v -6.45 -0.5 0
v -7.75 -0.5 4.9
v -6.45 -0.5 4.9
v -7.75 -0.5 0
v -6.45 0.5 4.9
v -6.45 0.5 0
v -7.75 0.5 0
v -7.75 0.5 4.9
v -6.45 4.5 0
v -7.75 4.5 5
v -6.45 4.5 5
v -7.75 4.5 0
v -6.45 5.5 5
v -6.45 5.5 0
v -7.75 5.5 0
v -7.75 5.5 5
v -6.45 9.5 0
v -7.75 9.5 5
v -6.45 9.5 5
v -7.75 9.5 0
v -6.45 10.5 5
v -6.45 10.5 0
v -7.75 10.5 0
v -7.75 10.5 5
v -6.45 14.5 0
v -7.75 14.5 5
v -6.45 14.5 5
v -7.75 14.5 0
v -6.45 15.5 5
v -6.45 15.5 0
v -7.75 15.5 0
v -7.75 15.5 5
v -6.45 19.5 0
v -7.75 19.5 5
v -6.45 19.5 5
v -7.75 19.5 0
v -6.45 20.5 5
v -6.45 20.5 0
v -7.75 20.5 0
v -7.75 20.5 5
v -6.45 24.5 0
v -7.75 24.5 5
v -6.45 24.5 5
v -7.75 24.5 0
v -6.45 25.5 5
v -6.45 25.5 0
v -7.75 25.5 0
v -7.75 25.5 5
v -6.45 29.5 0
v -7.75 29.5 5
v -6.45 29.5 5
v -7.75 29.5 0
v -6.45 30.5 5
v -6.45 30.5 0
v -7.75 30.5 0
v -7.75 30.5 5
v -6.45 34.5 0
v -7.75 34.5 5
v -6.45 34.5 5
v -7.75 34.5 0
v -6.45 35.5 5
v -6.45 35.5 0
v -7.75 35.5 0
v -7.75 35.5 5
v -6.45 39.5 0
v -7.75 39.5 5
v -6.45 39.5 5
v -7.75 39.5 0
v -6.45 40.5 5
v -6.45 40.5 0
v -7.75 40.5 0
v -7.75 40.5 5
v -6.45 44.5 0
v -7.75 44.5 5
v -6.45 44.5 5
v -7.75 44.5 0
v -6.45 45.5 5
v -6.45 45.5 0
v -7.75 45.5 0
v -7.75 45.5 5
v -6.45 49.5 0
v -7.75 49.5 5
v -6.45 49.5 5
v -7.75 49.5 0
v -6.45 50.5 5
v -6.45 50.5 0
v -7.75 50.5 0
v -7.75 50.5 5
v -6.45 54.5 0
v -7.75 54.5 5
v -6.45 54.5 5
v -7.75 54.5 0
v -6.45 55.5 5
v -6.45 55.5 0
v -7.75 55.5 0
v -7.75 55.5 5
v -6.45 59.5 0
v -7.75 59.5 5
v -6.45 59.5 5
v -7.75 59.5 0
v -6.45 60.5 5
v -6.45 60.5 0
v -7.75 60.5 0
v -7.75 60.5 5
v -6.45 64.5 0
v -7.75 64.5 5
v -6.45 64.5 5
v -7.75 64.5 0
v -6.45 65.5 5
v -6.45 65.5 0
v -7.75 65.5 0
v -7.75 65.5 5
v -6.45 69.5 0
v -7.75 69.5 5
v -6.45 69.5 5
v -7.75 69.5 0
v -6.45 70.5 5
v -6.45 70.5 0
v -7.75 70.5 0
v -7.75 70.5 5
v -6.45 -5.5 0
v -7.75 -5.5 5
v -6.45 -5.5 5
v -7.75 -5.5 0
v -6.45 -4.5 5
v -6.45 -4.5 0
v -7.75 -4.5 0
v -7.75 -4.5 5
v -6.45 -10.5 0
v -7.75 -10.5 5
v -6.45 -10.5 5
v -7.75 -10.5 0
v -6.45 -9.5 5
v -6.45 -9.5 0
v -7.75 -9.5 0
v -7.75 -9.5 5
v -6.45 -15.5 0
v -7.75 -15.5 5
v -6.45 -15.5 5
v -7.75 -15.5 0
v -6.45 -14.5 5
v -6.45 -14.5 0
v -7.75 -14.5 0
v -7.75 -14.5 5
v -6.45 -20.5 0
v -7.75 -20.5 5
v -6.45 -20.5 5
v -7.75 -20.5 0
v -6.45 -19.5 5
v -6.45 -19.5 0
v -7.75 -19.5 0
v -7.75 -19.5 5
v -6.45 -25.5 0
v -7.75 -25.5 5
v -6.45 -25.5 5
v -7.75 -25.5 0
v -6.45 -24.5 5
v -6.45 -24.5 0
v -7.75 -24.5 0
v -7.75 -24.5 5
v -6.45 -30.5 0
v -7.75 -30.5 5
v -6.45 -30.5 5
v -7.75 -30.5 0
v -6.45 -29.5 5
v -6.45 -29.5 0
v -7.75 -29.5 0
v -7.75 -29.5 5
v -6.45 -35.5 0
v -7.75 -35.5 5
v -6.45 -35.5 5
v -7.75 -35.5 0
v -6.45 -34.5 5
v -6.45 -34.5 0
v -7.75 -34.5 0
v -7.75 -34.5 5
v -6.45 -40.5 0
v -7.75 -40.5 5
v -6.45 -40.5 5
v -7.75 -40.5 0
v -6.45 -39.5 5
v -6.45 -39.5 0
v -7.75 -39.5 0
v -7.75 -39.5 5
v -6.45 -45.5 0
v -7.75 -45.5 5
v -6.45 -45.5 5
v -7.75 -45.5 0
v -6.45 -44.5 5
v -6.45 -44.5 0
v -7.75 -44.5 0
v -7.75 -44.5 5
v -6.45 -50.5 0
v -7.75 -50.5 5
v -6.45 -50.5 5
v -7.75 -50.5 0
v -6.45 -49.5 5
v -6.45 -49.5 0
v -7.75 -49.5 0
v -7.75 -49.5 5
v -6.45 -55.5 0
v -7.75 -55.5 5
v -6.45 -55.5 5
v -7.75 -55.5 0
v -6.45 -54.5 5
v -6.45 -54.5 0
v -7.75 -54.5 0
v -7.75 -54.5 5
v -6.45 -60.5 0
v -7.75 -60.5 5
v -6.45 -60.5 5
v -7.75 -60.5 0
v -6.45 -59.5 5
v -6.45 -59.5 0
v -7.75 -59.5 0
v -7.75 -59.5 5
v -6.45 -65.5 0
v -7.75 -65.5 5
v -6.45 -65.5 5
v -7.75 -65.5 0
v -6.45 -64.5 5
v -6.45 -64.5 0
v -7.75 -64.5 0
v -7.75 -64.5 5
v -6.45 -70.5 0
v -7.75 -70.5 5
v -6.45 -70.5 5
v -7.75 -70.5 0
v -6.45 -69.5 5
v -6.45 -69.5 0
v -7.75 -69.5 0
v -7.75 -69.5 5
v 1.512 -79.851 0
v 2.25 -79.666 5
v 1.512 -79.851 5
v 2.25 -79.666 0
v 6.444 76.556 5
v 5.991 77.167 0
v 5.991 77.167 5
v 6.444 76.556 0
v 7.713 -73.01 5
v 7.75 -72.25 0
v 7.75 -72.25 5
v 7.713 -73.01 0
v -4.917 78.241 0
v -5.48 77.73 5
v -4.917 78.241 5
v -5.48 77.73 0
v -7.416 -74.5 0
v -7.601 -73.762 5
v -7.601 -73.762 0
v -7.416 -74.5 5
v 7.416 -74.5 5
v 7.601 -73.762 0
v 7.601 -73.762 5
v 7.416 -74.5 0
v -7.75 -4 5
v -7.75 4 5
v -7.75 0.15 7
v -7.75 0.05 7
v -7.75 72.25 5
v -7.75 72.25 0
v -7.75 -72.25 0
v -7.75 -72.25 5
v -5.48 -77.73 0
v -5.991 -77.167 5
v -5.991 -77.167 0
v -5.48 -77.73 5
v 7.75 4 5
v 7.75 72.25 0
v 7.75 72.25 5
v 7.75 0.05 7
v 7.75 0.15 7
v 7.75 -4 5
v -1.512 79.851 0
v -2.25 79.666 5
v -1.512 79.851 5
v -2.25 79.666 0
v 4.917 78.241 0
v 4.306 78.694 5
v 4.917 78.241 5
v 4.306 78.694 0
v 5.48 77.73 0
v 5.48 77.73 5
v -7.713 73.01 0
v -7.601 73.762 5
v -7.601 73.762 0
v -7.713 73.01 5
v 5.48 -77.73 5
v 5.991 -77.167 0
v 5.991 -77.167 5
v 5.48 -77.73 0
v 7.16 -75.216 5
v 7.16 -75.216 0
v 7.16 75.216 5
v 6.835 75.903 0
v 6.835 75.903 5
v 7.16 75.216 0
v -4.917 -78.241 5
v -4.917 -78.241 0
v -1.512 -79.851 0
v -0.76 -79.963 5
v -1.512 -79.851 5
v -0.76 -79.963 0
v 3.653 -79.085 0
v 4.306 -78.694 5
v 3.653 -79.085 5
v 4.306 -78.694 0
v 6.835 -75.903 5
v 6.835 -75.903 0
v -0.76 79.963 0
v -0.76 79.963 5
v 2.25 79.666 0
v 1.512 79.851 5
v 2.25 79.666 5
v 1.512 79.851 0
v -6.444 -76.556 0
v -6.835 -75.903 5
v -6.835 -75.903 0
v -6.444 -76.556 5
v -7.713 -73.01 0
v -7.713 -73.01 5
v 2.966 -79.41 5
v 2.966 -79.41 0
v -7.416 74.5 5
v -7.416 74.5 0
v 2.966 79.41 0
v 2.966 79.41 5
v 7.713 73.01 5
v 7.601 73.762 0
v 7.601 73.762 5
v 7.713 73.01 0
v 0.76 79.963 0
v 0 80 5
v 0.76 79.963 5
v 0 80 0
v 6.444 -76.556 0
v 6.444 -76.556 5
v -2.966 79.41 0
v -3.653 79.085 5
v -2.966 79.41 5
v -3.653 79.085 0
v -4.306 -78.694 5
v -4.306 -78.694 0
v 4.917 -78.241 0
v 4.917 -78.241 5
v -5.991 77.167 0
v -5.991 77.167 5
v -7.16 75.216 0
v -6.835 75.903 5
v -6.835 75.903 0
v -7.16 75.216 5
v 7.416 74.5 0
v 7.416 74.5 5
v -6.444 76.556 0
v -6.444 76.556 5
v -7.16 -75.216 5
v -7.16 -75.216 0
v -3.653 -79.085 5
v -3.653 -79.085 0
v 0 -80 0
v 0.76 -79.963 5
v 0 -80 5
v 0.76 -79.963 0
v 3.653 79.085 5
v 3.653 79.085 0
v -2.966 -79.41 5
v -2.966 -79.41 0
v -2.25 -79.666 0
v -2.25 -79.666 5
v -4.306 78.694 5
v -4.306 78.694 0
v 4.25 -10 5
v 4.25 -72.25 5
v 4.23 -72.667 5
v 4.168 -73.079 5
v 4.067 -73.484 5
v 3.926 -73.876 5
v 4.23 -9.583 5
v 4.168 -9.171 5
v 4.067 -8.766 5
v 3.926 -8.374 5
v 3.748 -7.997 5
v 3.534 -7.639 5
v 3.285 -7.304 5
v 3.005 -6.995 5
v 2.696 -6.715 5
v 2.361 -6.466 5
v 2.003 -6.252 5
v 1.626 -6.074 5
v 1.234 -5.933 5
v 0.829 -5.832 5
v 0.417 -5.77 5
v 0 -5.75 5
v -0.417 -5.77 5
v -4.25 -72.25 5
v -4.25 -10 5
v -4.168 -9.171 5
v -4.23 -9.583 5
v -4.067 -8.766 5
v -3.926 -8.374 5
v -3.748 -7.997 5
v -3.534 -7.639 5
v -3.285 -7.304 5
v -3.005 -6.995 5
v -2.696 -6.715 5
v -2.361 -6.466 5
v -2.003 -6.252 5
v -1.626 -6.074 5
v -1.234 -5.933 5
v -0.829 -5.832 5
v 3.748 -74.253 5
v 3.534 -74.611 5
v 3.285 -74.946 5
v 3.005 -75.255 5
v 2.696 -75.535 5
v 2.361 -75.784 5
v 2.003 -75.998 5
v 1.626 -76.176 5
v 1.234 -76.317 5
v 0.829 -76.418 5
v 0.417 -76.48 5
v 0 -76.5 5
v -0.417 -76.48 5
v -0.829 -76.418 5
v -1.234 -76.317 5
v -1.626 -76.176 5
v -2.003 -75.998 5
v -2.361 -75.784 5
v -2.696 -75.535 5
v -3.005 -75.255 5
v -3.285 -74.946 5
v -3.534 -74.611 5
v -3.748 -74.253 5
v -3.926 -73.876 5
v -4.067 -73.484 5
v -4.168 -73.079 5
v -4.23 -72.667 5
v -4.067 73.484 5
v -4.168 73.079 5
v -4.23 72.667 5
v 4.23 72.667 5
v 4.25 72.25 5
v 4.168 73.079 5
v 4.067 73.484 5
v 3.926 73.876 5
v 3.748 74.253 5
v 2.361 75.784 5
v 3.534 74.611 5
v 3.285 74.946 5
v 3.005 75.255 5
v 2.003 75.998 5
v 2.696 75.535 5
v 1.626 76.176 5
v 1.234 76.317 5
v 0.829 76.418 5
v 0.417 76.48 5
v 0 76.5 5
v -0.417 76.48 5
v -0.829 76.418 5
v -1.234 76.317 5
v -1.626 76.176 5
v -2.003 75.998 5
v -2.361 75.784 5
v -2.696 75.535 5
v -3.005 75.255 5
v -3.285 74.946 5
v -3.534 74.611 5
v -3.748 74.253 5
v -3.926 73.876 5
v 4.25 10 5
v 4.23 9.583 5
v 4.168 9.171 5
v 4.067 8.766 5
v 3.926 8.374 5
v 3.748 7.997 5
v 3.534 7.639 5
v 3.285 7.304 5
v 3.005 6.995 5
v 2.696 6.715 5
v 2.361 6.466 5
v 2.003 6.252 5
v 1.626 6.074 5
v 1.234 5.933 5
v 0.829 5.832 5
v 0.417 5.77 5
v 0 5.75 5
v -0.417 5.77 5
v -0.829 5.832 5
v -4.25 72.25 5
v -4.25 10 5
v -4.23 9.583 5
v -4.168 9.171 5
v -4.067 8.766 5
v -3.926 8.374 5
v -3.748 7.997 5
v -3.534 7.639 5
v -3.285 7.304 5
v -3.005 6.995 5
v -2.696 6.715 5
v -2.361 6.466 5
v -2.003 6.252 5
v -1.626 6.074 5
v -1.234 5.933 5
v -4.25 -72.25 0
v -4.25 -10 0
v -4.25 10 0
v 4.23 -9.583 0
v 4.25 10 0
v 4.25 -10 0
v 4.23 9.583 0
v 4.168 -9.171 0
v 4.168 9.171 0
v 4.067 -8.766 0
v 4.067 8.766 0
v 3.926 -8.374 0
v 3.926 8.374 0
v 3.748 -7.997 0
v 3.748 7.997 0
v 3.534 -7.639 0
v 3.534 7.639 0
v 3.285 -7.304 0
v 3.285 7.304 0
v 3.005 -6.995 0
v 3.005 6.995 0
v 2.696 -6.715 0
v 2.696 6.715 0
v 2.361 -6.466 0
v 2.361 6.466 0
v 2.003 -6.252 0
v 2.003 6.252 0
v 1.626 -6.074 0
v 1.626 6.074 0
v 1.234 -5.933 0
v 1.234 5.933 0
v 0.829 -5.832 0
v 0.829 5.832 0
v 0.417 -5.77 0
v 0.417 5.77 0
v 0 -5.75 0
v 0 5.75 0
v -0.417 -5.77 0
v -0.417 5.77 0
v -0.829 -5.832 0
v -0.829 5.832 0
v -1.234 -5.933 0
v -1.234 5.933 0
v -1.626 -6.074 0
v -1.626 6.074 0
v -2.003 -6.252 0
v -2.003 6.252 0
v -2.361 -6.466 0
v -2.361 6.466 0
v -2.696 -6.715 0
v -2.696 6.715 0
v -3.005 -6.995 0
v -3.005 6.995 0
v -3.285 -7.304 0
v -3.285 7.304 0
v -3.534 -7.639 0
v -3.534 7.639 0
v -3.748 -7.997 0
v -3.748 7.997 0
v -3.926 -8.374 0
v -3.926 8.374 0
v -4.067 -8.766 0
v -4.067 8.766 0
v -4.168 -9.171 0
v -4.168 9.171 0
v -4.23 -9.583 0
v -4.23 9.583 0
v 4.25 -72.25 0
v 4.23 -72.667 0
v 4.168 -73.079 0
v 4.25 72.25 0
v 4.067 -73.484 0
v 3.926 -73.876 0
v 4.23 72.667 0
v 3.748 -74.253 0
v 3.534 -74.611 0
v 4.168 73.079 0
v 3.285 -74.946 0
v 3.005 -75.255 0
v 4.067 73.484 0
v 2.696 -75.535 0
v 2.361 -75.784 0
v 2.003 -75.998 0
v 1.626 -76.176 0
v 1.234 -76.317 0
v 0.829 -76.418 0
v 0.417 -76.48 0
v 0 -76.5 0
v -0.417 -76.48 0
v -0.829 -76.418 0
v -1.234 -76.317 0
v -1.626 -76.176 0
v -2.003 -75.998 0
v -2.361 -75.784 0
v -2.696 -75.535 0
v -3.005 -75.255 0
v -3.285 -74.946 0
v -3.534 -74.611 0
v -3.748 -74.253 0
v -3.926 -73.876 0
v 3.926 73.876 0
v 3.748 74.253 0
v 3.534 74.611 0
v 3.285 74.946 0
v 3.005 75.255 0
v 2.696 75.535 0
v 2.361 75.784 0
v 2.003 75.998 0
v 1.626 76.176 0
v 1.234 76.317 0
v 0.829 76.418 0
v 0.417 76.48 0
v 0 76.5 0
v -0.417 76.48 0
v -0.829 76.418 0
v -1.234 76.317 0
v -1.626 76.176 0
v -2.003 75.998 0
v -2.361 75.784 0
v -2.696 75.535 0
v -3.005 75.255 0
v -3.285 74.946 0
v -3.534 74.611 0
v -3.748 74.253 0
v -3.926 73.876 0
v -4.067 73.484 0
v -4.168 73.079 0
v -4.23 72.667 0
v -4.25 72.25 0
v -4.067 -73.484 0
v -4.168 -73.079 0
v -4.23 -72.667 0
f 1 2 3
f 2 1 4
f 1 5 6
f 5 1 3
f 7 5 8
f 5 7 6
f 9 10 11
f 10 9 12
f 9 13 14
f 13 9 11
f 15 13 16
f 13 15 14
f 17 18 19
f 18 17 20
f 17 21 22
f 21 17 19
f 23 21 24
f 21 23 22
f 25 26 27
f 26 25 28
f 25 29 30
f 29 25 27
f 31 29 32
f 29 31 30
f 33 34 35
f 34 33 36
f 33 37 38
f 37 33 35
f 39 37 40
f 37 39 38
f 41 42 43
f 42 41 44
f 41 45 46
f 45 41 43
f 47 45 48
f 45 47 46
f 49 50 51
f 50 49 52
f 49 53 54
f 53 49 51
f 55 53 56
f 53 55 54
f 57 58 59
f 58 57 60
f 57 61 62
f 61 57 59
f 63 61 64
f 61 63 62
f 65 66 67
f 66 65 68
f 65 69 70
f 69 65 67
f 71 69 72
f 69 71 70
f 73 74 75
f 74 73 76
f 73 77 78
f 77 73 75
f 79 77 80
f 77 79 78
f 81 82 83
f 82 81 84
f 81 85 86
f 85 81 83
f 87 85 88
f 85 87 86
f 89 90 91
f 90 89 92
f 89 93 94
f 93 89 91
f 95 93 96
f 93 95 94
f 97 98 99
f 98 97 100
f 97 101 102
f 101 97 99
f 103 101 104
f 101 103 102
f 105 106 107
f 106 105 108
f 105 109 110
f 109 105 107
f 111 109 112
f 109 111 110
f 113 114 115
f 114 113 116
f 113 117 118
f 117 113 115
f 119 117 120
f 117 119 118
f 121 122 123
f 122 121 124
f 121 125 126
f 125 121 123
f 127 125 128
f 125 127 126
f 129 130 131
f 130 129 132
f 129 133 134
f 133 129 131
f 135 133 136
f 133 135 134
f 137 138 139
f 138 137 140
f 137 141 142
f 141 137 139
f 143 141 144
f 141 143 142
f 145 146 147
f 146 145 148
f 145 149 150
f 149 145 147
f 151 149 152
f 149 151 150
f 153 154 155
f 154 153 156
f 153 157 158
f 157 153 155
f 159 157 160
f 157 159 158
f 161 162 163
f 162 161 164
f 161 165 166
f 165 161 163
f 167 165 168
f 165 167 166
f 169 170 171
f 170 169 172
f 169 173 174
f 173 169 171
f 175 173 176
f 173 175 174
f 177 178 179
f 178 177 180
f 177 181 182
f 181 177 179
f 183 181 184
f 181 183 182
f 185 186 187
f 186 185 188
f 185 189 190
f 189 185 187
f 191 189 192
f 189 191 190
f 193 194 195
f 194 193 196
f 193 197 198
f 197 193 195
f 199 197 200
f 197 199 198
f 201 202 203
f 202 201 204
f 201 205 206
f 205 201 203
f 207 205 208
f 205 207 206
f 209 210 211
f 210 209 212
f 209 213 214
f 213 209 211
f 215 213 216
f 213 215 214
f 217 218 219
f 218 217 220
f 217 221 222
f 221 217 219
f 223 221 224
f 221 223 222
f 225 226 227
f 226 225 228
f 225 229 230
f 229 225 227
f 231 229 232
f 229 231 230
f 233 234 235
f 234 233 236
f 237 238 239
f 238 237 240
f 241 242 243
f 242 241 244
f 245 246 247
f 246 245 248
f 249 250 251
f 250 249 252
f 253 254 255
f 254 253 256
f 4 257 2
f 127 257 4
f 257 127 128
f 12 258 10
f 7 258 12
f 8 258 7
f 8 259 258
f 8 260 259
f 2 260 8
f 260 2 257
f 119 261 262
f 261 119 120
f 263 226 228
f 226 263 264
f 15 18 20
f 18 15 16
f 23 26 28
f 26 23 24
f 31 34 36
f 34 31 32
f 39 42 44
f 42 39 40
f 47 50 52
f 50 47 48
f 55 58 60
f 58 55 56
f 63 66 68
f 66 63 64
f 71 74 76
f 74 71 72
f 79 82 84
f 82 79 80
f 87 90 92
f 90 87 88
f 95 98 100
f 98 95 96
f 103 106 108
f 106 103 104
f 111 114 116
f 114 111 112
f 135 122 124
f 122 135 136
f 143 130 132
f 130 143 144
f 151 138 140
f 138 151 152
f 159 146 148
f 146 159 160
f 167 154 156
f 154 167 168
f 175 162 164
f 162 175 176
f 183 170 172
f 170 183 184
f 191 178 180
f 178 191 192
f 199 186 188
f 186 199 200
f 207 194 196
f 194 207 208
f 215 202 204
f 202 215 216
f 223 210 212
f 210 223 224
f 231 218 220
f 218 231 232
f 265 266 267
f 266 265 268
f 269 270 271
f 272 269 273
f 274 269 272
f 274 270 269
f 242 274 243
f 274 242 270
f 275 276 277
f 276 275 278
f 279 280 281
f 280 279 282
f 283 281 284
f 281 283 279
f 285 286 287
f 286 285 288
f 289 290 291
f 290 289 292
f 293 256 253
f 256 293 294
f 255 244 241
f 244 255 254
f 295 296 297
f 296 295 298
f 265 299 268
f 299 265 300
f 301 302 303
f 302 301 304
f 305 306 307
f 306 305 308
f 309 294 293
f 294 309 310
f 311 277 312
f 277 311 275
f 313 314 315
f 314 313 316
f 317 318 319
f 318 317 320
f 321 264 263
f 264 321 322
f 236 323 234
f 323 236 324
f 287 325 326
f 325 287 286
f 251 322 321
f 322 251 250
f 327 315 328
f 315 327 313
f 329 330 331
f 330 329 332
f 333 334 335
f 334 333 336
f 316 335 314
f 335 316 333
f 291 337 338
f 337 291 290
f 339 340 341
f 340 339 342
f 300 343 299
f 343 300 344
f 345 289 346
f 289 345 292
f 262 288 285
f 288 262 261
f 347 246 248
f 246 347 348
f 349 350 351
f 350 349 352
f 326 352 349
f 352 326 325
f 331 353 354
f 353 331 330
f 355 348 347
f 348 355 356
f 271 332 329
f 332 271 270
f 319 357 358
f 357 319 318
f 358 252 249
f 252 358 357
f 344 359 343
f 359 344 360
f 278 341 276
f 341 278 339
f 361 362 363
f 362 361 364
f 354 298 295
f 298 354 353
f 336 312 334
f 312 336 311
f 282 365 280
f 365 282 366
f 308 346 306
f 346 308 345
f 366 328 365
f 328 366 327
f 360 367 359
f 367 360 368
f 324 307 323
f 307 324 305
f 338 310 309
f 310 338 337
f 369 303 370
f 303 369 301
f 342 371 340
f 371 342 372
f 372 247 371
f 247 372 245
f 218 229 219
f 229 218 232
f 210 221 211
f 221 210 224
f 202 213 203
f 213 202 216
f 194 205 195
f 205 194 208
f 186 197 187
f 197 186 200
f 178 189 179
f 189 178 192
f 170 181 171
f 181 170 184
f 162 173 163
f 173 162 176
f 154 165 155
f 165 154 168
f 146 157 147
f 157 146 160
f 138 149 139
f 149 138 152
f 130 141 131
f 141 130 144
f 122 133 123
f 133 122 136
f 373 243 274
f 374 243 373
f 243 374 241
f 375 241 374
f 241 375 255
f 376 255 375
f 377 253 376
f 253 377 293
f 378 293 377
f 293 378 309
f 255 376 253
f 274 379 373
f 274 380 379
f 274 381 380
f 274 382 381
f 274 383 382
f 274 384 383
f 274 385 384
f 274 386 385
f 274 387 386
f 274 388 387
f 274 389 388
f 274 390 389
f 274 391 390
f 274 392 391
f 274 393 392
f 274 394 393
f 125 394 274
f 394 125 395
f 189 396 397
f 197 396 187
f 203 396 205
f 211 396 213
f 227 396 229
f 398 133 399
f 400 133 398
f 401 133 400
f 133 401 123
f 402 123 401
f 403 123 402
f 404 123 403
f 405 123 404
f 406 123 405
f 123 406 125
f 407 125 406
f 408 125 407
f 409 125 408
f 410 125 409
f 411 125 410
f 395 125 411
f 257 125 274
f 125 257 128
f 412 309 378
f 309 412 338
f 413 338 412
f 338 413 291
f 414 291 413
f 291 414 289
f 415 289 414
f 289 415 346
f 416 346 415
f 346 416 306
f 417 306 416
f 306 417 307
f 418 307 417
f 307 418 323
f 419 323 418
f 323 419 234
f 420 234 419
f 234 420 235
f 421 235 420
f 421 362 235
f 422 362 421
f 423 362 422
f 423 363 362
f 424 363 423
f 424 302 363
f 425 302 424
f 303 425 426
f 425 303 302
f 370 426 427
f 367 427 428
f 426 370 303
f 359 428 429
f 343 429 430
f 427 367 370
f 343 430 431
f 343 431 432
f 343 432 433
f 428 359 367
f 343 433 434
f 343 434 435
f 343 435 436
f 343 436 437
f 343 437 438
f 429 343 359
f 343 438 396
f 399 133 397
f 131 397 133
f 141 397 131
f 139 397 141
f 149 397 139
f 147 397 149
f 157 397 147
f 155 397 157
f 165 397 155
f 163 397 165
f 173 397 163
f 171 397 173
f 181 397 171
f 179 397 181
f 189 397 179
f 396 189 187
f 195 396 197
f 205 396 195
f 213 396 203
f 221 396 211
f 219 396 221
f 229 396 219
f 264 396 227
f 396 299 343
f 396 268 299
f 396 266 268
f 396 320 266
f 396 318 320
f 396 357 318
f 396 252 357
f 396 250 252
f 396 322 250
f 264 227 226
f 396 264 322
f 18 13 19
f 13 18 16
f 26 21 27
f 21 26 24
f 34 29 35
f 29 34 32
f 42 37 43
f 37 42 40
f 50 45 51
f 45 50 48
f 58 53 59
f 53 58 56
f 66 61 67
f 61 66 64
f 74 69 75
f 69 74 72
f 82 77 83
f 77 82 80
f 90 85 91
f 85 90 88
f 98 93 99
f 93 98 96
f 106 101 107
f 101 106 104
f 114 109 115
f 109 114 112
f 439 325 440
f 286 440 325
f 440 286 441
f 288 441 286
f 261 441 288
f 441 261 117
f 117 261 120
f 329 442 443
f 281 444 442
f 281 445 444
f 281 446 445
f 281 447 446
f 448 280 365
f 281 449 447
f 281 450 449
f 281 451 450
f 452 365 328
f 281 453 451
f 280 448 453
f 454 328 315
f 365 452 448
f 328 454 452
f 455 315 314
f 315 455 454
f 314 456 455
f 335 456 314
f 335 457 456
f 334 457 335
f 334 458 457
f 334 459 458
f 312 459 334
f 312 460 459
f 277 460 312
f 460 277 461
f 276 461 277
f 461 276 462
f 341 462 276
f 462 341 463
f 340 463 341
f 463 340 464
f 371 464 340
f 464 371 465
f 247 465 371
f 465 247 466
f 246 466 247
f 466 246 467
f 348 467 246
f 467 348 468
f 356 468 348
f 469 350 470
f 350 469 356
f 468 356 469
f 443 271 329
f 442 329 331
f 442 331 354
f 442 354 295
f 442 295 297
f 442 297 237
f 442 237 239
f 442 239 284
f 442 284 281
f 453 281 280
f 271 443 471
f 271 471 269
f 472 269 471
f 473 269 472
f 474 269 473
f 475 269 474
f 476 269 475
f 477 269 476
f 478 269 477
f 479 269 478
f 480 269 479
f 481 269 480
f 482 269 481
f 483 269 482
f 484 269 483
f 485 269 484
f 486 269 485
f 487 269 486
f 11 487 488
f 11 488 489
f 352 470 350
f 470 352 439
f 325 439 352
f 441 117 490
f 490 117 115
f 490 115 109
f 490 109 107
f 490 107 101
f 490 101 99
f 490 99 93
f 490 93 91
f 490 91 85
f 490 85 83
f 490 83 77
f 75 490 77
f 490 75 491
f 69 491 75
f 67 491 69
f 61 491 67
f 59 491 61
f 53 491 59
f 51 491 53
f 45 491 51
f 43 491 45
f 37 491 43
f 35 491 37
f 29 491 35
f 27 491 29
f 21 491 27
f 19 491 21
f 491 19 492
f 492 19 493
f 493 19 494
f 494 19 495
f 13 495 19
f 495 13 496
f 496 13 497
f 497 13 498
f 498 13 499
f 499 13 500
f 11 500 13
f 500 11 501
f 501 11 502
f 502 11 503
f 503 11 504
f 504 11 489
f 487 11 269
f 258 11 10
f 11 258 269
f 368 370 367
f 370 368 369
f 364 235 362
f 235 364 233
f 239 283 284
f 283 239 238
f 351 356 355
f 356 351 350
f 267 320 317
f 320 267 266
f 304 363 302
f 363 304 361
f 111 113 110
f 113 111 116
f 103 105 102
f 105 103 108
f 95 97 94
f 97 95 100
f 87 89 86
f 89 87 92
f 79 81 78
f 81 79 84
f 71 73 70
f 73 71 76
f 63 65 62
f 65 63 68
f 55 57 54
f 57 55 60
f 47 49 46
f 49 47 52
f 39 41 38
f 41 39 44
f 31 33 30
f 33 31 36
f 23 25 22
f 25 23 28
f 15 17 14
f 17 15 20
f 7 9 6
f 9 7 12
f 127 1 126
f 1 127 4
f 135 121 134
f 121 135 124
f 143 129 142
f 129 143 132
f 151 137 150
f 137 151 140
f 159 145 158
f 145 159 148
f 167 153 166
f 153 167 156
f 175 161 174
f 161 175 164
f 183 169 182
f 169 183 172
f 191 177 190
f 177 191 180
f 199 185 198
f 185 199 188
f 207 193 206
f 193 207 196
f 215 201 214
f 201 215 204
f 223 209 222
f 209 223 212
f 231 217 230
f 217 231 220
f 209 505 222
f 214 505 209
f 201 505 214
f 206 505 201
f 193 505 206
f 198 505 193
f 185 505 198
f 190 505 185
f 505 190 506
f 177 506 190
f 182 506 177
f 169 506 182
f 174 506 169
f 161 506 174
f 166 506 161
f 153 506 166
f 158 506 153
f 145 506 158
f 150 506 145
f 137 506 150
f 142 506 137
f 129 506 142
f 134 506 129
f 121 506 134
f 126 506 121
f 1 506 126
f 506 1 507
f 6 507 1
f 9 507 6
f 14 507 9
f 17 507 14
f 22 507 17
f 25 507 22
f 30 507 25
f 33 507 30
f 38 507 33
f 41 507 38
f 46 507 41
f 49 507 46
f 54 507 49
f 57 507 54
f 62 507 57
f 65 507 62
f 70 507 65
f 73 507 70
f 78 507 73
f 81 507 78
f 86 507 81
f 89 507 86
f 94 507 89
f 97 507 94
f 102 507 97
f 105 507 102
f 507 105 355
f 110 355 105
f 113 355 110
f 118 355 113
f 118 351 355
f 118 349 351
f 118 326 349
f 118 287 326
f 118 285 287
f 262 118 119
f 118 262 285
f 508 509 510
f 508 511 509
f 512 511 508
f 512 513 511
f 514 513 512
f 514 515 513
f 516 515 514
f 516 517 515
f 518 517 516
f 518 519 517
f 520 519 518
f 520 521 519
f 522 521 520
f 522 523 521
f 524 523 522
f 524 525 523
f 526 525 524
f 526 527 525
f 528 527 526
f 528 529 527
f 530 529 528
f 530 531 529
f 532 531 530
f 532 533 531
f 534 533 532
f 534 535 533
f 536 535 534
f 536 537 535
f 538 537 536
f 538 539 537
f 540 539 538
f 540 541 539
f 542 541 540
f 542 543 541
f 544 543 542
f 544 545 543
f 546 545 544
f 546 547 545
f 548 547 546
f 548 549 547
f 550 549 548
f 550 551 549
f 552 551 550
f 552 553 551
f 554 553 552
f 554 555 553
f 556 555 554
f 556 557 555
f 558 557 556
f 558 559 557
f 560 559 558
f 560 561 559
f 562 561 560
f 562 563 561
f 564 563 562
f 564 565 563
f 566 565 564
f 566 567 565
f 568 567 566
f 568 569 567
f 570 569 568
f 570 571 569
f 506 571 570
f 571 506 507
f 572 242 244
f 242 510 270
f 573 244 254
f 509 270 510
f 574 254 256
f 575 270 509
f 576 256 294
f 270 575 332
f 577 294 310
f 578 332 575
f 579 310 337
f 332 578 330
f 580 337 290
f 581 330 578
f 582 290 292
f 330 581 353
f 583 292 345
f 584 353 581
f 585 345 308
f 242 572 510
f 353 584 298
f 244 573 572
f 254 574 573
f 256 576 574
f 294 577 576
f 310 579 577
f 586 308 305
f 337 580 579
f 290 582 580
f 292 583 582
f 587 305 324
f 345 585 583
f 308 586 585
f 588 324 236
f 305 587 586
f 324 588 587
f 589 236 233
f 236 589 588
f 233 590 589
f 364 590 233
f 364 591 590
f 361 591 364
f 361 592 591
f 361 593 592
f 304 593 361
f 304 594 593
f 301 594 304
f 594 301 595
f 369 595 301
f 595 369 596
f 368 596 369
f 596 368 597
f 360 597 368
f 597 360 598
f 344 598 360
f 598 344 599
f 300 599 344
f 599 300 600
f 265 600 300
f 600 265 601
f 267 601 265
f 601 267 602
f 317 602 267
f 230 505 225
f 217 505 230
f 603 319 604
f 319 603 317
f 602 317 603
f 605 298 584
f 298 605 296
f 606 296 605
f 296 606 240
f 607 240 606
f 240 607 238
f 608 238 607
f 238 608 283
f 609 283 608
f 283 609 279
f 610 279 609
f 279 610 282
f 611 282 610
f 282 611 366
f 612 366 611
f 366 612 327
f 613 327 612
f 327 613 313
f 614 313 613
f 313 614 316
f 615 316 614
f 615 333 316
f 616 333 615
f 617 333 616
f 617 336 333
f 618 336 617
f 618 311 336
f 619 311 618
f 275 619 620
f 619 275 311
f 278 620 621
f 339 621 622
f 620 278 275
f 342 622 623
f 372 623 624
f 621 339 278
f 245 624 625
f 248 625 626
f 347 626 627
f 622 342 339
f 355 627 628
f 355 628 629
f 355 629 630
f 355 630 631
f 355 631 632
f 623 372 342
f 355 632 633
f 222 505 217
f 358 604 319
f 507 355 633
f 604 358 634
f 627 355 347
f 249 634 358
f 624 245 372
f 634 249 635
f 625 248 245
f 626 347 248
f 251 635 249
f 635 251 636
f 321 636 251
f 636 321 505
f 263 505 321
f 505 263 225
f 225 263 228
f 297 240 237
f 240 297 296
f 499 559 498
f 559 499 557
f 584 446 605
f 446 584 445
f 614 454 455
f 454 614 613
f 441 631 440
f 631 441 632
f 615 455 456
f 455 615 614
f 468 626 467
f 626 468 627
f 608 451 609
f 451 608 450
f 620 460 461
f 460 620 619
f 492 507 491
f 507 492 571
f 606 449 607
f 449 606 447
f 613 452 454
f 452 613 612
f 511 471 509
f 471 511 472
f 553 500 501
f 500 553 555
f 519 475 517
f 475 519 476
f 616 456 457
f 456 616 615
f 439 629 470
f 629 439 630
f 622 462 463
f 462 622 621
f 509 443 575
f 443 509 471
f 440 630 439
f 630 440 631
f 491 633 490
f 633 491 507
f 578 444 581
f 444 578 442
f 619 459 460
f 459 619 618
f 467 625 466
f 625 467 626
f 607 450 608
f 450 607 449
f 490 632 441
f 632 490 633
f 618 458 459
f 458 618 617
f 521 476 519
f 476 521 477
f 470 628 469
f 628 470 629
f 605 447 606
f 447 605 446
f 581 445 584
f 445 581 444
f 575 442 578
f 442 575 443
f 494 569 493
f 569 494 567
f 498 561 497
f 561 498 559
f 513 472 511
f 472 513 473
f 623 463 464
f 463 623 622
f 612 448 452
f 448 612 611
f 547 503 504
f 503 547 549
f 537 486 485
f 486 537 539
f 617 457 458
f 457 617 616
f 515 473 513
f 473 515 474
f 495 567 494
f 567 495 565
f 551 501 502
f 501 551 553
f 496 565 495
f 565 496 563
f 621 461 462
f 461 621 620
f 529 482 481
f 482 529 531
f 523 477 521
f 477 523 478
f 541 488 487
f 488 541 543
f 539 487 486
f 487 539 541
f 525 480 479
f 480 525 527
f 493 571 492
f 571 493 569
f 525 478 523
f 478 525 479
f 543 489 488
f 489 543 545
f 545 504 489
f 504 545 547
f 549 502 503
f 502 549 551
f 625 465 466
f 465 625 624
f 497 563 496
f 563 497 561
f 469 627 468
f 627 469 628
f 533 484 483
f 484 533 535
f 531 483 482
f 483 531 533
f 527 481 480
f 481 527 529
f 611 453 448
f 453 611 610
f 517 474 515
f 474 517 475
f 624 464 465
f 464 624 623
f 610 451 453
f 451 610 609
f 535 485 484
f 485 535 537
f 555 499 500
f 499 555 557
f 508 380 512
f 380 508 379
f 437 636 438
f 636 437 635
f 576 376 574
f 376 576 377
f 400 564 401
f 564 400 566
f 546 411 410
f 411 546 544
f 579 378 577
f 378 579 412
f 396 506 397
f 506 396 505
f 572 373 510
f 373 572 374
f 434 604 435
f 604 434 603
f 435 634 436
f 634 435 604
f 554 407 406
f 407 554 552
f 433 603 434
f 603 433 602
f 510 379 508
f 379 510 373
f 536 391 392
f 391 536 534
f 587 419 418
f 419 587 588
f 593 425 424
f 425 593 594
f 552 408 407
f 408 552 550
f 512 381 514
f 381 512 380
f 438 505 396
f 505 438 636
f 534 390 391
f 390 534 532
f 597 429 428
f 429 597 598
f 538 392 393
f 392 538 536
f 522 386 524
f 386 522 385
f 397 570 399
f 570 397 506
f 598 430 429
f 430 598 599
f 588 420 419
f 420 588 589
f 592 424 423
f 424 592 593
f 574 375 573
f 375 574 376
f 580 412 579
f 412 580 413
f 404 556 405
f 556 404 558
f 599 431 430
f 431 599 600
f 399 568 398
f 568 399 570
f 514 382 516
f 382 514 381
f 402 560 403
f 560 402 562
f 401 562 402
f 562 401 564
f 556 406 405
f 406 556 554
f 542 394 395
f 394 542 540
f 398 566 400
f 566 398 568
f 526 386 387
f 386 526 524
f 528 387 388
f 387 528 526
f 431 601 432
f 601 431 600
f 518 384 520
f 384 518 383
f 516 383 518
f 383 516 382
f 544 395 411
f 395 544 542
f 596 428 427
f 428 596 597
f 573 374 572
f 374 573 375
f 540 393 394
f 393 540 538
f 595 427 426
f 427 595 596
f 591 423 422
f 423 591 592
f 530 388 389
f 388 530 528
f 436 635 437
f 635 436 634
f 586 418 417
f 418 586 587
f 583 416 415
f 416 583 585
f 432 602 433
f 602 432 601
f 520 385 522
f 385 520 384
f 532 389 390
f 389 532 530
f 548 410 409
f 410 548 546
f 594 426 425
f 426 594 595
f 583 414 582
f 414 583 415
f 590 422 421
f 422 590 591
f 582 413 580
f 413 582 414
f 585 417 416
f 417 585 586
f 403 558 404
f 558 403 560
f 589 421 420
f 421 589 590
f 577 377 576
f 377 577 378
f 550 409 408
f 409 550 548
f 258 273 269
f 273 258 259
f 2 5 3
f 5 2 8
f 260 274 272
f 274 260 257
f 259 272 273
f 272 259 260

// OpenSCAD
// Length of the cutting guide
length = 160;
// Inner cutout for the screws
inner = 8.5;
// Thickness of the walls
walls = 3.5;
// Height of the cutting guide
height = 5;

/* [Guide] */
// Enable guide
guide = "enabled"; // [enabled: Enabled, disabled: Disabled]
// Width of the triangular guide
guideWidth = 8;
// Height of the triangular guide
guideHeight = 2;

/* [Ruler] */
ruler = "enabled"; // [enabled: Enabled, disabled: Disabled]
// Depth of the intendation
indentationDepth = 1.2;
// Inner width of intendation
indentationInner = 1;
// Outer width of intendation
indentationOuter = 1;
// Space between intendations
steps = 5;

/* [Hidden] */
$fn = 64;
innerRadius = inner / 2;
outerRadius = innerRadius + walls;
offsetY = guideWidth / 2 + walls;
offsetY = innerRadius + guideWidth / 2 + walls / 2;

difference() {
    hull() {
        translate([0, length / 2 - outerRadius, 0])
            cylinder(r = outerRadius, h = height);

        translate([0, -length / 2 + outerRadius, 0])
            cylinder(r = outerRadius, h = height);
    }

    hull() {
        translate([0, length / 2 - innerRadius - walls, -1])
            cylinder(r = innerRadius, h = height + 2);

        translate([0, offsetY, -1])
            cylinder(r = innerRadius, h = height + 2);
    }
    
    hull() {
        translate([0, -offsetY, -1])
            cylinder(r = innerRadius, h = height + 2);

        translate([0, -length / 2 + outerRadius, -1])
            cylinder(r = innerRadius, h = height + 2);
    }
    
    if(ruler == "enabled") {
        for(i=[0:1:(length / 2 / steps - outerRadius / steps)]) {
            hull() {
                translate([-outerRadius + indentationDepth, steps * i - indentationInner / 2, -1])
                    cube([0.1, indentationInner, height + 2]);
            
                translate([-(outerRadius + indentationDepth), steps * i - indentationOuter / 2, -1])
                    cube([0.1, indentationOuter, height + 2]);
            }
        }

        for(i=[0:-1:-(length / 2 / steps - outerRadius / steps)]) {
            hull() {
                translate([-outerRadius + indentationDepth, steps * i - indentationInner / 2, -1])
                    cube([0.1, indentationInner, height + 2]);
            
                translate([-(outerRadius + indentationDepth), steps * i - indentationOuter / 2, -1])
                    cube([0.1, indentationOuter, height + 2]);
            }
        }
    }
}

if(guide == "enabled") {
    hull() {
        translate([-outerRadius, -guideWidth / 2, height - 0.1])
            cube([outerRadius * 2, guideWidth, 0.1]);
        
        translate([-outerRadius, 0.05, height + guideHeight - 0.1])
            cube([outerRadius * 2, 0.1, 0.1]);
    }
}
